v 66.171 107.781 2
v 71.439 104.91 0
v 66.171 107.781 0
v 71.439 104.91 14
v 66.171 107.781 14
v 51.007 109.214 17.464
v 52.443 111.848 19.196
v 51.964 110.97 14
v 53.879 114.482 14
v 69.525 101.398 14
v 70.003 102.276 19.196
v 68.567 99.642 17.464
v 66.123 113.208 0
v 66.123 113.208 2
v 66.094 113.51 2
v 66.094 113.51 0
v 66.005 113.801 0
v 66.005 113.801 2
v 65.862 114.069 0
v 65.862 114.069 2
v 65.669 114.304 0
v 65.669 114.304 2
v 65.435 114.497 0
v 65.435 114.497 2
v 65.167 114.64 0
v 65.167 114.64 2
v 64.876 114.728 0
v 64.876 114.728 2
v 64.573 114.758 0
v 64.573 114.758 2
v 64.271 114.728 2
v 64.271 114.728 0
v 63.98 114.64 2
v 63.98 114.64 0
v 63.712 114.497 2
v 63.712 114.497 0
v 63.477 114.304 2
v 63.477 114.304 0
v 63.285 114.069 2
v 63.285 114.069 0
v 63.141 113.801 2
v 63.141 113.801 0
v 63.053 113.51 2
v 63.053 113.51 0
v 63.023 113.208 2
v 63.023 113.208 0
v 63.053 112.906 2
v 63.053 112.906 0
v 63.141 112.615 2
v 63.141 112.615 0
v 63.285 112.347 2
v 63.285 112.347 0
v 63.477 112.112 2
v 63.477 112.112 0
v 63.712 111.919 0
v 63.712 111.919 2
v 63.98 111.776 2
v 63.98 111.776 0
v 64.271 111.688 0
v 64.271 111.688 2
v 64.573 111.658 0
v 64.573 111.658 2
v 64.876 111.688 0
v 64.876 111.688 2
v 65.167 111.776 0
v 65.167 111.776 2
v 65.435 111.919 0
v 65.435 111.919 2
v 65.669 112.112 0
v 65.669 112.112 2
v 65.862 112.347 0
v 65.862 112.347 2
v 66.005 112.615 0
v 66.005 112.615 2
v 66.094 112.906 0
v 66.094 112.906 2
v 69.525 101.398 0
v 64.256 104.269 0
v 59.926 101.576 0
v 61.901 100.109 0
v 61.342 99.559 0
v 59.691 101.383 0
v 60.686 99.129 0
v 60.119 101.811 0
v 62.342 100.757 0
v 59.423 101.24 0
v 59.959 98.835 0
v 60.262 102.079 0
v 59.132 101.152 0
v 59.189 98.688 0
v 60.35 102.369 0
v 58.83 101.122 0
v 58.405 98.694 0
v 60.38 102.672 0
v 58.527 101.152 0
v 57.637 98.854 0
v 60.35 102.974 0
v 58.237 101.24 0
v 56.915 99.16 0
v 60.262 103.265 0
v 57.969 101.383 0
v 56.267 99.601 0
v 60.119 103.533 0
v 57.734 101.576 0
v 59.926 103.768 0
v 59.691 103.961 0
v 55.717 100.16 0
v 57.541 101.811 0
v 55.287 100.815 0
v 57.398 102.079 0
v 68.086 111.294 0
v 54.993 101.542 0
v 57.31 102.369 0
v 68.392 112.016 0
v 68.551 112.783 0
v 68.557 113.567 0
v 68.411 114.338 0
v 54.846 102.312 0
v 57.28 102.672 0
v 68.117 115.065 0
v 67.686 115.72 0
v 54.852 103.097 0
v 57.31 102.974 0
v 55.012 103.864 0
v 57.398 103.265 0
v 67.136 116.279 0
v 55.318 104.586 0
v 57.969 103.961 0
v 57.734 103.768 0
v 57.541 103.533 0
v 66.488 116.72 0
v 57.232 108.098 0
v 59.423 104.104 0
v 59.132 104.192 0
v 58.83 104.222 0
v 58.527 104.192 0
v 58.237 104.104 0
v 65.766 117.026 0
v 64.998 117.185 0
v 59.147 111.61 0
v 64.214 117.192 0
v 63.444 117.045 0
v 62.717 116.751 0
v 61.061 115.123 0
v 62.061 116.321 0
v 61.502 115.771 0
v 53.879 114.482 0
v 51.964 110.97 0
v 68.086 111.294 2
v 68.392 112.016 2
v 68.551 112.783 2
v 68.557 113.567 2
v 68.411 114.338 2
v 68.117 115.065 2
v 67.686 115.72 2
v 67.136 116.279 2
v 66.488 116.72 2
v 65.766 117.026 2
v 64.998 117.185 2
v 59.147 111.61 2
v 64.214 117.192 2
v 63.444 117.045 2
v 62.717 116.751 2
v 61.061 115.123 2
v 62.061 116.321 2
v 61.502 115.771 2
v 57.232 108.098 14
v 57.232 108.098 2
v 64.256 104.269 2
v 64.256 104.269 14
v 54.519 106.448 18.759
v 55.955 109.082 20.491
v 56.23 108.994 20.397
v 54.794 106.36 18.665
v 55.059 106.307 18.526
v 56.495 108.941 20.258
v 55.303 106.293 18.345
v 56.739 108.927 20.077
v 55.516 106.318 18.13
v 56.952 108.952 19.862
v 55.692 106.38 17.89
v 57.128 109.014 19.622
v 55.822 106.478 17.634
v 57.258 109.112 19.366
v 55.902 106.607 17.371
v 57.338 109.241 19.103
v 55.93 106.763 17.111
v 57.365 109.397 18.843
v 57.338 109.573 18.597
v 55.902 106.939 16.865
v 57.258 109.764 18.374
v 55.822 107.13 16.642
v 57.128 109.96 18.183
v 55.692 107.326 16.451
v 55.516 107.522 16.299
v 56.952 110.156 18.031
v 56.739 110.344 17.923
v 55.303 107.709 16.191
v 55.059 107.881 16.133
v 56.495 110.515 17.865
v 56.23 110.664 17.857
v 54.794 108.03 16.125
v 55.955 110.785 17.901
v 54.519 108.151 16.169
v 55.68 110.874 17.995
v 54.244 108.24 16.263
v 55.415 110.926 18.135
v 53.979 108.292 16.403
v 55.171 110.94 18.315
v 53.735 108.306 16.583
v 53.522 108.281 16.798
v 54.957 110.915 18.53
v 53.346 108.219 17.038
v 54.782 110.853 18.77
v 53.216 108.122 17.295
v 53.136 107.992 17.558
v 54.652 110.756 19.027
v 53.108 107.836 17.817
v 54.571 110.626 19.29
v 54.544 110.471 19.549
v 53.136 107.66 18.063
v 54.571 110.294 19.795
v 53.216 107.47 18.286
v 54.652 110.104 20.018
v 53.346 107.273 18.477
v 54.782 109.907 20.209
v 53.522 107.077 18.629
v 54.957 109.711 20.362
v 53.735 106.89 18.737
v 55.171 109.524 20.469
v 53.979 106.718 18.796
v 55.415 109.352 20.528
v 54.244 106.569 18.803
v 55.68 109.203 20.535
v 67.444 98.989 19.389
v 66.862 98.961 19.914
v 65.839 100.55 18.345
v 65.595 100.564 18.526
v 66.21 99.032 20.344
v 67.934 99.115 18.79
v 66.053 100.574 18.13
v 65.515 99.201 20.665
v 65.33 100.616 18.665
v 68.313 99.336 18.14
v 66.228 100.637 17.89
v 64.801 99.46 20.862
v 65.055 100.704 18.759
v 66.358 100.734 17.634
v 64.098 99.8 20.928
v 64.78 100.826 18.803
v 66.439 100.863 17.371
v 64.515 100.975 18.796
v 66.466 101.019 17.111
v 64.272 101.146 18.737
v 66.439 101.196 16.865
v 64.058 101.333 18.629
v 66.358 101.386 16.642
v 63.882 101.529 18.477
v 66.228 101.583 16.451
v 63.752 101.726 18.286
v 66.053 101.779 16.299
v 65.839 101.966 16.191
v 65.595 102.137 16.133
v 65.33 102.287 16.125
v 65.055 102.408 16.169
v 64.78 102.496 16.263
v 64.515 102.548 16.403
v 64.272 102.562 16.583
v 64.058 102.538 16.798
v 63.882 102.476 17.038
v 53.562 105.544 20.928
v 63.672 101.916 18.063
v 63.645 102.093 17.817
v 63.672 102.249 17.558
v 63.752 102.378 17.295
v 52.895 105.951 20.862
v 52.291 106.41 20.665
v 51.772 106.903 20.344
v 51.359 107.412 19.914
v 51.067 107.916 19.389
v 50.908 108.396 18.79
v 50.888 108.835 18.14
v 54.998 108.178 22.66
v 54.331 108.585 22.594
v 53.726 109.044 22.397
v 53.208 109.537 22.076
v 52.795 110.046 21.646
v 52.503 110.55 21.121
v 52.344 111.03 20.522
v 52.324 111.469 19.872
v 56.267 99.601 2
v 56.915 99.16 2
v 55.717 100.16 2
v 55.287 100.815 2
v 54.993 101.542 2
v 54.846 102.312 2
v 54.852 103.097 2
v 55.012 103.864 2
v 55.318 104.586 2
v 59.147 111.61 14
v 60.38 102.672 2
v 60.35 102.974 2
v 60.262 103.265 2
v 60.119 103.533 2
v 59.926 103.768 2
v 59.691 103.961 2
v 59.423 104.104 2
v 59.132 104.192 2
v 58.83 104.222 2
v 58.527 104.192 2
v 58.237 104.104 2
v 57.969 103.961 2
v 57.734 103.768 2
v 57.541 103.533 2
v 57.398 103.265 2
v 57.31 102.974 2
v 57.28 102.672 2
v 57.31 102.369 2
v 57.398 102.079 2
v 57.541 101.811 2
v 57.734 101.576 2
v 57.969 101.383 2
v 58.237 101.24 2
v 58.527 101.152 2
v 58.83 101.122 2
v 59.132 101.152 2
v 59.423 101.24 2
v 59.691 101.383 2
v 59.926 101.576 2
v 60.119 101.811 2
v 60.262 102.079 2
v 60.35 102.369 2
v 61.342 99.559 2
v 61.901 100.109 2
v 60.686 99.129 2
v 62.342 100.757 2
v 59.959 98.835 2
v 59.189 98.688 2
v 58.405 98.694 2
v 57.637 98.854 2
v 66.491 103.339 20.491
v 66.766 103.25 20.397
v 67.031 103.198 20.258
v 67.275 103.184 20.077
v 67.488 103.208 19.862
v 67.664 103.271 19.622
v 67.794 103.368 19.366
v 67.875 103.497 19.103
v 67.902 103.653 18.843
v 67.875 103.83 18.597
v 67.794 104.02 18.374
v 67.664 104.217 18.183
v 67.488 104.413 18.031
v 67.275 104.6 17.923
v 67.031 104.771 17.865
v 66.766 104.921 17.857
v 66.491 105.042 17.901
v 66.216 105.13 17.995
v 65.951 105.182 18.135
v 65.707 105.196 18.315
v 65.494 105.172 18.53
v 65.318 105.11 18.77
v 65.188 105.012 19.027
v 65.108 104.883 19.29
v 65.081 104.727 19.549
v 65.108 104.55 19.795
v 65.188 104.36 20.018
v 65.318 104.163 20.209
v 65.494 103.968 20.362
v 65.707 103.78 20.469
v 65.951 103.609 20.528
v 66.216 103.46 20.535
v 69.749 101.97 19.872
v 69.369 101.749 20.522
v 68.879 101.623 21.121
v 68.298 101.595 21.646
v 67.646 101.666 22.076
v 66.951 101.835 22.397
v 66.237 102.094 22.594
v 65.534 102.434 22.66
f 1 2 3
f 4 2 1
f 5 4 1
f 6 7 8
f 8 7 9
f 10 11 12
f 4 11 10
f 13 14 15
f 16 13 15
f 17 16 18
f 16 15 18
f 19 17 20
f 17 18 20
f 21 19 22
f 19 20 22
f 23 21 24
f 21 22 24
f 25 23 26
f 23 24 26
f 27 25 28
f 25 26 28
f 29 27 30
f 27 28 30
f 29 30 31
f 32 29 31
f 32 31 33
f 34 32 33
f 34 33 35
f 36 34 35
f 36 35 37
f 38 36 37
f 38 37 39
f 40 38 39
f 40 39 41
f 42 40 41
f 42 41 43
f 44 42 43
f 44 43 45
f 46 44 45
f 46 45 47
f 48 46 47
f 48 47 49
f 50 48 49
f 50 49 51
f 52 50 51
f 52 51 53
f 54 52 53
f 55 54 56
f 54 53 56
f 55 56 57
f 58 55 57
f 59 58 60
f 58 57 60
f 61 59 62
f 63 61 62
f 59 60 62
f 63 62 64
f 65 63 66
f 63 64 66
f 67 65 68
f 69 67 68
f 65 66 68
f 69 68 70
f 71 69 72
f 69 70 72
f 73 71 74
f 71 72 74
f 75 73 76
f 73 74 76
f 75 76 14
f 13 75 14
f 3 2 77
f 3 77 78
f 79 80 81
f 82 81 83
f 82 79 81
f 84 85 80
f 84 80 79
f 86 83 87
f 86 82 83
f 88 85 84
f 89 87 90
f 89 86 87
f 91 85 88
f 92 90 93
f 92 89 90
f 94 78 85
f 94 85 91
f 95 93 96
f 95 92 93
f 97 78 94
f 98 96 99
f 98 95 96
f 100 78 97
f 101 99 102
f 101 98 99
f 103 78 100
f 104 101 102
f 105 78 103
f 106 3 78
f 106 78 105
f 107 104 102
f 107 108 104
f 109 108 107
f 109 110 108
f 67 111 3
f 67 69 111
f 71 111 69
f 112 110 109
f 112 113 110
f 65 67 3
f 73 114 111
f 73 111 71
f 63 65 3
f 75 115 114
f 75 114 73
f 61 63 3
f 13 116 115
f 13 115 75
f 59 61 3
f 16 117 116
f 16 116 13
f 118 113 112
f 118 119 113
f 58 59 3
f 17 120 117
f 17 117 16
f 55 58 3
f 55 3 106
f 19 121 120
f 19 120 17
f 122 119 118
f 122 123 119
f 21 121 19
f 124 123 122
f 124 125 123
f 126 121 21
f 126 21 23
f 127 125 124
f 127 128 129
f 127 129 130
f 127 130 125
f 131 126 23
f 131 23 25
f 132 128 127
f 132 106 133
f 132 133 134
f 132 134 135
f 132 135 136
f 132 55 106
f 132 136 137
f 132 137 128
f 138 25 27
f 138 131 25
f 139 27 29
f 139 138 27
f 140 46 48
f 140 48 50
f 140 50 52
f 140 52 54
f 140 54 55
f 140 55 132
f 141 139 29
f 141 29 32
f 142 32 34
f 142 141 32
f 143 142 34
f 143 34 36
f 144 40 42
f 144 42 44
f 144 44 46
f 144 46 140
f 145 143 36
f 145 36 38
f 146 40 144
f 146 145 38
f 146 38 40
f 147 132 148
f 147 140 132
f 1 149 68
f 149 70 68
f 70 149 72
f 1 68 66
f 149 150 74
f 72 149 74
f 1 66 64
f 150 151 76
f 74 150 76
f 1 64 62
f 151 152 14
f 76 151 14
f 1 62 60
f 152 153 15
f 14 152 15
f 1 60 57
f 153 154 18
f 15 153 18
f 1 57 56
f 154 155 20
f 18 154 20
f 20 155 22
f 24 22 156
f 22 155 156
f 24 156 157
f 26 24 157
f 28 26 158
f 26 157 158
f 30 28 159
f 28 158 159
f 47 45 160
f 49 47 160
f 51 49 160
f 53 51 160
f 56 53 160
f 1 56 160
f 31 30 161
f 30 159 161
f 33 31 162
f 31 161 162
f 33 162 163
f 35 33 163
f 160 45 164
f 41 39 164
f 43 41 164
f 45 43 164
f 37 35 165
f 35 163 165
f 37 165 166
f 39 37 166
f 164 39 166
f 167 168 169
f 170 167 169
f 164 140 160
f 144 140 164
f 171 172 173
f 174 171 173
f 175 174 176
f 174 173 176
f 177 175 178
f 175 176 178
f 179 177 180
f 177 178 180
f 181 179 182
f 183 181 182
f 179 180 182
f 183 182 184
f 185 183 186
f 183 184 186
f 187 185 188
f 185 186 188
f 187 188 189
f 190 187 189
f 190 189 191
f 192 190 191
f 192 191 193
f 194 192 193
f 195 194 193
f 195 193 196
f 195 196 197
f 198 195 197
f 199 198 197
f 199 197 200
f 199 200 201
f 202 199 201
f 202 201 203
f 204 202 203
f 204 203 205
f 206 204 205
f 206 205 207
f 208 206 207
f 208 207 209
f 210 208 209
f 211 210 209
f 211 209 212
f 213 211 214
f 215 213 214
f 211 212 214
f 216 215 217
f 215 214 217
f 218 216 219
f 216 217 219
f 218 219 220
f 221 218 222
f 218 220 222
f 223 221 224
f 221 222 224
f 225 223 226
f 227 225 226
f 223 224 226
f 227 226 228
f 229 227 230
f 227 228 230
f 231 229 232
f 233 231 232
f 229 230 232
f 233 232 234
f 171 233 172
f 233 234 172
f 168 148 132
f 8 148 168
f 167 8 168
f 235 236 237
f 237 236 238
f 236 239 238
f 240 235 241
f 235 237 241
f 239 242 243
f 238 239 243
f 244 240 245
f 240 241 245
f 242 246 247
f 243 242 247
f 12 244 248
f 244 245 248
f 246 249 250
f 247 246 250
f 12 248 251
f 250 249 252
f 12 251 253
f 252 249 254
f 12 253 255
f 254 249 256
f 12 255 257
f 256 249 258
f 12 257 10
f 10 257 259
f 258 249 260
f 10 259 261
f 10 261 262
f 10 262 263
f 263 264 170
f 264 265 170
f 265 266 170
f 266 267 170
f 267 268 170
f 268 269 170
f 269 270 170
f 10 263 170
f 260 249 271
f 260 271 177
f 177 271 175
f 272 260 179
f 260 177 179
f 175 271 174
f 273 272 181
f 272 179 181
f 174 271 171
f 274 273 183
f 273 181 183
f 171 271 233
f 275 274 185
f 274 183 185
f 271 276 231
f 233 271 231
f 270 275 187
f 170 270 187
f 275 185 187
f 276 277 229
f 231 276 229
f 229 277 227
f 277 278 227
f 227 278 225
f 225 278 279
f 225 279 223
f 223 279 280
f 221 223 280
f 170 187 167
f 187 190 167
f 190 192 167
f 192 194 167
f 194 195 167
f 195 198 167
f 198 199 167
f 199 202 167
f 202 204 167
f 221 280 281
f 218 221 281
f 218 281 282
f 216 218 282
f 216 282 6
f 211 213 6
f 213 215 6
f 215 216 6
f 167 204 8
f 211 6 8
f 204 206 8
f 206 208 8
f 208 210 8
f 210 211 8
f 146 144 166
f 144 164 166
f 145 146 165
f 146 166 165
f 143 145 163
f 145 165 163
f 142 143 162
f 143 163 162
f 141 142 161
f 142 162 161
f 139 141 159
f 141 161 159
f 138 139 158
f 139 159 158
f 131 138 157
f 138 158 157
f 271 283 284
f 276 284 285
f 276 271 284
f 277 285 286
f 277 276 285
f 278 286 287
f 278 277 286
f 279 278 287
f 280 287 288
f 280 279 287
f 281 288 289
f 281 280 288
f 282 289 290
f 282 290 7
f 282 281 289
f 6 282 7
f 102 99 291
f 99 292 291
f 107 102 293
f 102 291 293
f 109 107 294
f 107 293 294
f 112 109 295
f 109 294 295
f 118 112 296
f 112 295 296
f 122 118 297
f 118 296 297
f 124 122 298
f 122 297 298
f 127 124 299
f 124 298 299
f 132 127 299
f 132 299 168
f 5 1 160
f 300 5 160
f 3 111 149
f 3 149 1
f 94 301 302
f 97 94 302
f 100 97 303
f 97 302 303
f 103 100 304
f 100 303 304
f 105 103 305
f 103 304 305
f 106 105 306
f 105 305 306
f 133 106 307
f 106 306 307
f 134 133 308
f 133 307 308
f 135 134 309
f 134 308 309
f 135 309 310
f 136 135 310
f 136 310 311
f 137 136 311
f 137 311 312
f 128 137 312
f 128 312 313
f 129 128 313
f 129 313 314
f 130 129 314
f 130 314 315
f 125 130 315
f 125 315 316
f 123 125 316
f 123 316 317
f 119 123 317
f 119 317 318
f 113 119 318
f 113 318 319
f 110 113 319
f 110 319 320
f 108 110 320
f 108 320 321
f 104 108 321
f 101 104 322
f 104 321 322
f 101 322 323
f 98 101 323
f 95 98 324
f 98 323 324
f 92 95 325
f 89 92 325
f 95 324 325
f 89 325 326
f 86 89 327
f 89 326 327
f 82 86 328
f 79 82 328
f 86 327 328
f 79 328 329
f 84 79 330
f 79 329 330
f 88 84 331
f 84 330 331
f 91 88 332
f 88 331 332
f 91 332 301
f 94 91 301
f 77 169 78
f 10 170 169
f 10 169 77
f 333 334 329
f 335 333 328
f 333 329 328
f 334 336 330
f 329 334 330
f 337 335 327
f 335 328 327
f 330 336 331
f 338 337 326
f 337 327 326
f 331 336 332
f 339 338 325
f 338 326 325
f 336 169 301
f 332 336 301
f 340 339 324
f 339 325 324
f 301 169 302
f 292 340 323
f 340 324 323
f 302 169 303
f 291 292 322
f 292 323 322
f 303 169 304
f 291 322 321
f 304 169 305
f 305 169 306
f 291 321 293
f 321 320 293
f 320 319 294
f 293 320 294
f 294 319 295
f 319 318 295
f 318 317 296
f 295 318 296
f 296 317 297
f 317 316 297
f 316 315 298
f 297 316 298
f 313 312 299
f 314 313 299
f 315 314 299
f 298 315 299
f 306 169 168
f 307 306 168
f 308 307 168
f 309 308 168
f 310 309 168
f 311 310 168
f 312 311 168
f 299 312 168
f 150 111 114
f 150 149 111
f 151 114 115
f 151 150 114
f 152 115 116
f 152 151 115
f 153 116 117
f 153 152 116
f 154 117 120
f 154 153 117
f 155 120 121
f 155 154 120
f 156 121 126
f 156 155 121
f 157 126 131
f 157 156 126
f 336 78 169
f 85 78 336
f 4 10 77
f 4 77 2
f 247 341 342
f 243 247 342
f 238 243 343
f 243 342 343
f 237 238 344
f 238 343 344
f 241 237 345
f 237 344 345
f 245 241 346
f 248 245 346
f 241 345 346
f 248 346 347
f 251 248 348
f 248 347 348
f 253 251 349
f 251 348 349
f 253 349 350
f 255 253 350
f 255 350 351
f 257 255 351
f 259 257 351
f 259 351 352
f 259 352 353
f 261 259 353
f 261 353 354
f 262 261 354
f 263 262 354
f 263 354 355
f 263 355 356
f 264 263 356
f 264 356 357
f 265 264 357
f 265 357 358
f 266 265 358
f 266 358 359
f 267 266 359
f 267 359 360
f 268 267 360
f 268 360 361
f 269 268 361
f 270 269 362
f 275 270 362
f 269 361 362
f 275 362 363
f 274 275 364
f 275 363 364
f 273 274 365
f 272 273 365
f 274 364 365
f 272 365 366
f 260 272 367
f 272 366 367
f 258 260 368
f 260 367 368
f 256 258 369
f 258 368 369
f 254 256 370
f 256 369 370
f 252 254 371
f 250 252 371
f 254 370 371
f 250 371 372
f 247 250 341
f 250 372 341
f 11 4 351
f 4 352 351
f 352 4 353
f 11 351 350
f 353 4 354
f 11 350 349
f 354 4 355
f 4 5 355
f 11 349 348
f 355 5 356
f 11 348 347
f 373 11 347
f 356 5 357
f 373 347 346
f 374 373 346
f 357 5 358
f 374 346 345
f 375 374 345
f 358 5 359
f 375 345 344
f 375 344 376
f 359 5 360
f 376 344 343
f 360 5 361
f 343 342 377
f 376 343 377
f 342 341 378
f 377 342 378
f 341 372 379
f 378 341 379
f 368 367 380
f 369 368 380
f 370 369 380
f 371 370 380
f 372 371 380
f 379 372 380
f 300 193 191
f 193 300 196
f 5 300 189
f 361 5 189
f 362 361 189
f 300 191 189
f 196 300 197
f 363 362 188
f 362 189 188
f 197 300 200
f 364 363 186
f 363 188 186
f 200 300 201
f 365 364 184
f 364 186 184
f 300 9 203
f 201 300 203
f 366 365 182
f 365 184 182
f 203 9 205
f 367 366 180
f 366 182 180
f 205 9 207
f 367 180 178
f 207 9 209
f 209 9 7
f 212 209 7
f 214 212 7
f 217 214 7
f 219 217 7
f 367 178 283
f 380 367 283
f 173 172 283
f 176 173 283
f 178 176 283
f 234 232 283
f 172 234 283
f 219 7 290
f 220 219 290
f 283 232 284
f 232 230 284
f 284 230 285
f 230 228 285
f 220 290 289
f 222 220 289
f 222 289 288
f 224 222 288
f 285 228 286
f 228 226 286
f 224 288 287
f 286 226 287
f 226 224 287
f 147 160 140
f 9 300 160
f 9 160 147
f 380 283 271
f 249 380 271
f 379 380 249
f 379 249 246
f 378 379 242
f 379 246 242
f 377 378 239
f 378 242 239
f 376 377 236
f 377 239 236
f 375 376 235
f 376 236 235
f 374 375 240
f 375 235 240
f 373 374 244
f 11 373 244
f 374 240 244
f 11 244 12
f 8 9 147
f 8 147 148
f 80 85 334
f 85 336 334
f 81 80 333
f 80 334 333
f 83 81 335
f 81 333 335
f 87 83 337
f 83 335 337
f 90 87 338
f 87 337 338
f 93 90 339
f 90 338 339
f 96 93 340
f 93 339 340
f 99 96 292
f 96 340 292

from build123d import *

# Parameters (mm, degrees)
BOSS_EXTRUDE1_DEPTH             = 2
FILLET1_R                       = 4
CUT_EXTRUDE1_REACH              = 137.809
SKETCH2_R                       = 1.55
BOSS_EXTRUDE2_DEPTH             = 12
BOSS_EXTRUDE2_DIRECTION_2_REACH = 137.809
BOSS_EXTRUDE3_DEPTH             = 20
FILLET2_R                       = 4
CUT_EXTRUDE2_REACH              = 70.911
SKETCH5_R                       = 1.55


with BuildPart() as part:
    # Sketch1 → Boss-Extrude1 (new body)
    with BuildSketch(Plane.XY):
        Polygon((70, 114.805547545), (60.427350908, 97.245240333), (53.403228024, 101.07429997), (62.975877115, 118.634607181), align=None)
    extrude(amount=BOSS_EXTRUDE1_DEPTH)

    # Fillet1
    fillet1_edges = [part.edges().sort_by_distance(p)[0] for p in [
        (60.427350908, 97.245240333, 1),
        (53.403228024, 101.07429997, 1),
        (70, 114.805547545, 1),
        (62.975877115, 118.634607181, 1),
    ]]
    fillet(fillet1_edges, radius=FILLET1_R - 0.0001)  # a hair under: the kernel refuses the full size

    # Sketch2 → Cut-Extrude1 (cut, up to next)
    with BuildSketch(Plane.XY.offset(2), mode=Mode.PRIVATE) as cut_extrude1_sk1:
        with Locations((64.573408739, 113.208015921)):
            Circle(SKETCH2_R)
    cut_extrude1_tool1 = extrude(cut_extrude1_sk1.sketch, amount=-CUT_EXTRUDE1_REACH, mode=Mode.PRIVATE) & part.part
    # Sketch2 → Cut-Extrude1 (cut, up to next)
    with BuildSketch(Plane.XY.offset(2), mode=Mode.PRIVATE) as cut_extrude1_sk2:
        with Locations((58.829819284, 102.671831594)):
            Circle(SKETCH2_R)
    cut_extrude1_tool2 = extrude(cut_extrude1_sk2.sketch, amount=-CUT_EXTRUDE1_REACH, mode=Mode.PRIVATE) & part.part
    add(cut_extrude1_tool1.solids().sort_by_distance((64.573409, 113.208016, 2))[0], mode=Mode.SUBTRACT)
    add(cut_extrude1_tool2.solids().sort_by_distance((58.829819, 102.671832, 2))[0], mode=Mode.SUBTRACT)

    # Sketch3 → Boss-Extrude2 (add)
    with BuildSketch(Plane.XY.offset(2)):
        Polygon((66.170940363, 107.78142466), (59.146817479, 111.610484297), (53.878725315, 114.482279024), (51.964195497, 110.970217582), (57.23228766, 108.098422855), (64.256410545, 104.269363218), (69.524502708, 101.39756849), (71.439032527, 104.909629933), align=None)
    extrude(amount=BOSS_EXTRUDE2_DEPTH)

    # Boss-Extrude2 direction 2: up to this face of the body (flat: up to its plane)
    boss_extrude2_direction_2_end = Plane(part.part.faces().sort_by_distance((61.701614012, 107.939923757, 0))[0])
    # Sketch3 → Boss-Extrude2 direction 2 (add, up to the picked face)
    with BuildSketch(Plane.XY.offset(2), mode=Mode.PRIVATE) as boss_extrude2_direction_2_sk1:
        Polygon((66.170940363, 107.78142466), (59.146817479, 111.610484297), (53.878725315, 114.482279024), (51.964195497, 110.970217582), (57.23228766, 108.098422855), (64.256410545, 104.269363218), (69.524502708, 101.39756849), (71.439032527, 104.909629933), align=None)
    boss_extrude2_direction_2_tool1 = split(extrude(boss_extrude2_direction_2_sk1.sketch, amount=-BOSS_EXTRUDE2_DIRECTION_2_REACH, mode=Mode.PRIVATE), bisect_by=boss_extrude2_direction_2_end, keep=Keep.BOTH, mode=Mode.PRIVATE)
    add(boss_extrude2_direction_2_tool1.solids().sort_by(Axis((61.701614, 107.939924, 2), (0, 0, -1)))[0])

    # Sketch4 → Boss-Extrude3 (add)
    with BuildSketch(Plane(origin=(-6.575093345, 3.584280194, 0), x_dir=(0, 0, 1), z_dir=(-0.8780153605811593, 0.4786324545865408, 0))):
        Polygon((22.660254038, 121.305306045), (20.92820323, 118.305306045), (14, 122.305306045), (14, 126.305306045), align=None)
    extrude(amount=-BOSS_EXTRUDE3_DEPTH)

    # Fillet2
    fillet2_edges = [part.edges().sort_by_distance(p)[0] for p in [
        (50.76761436, 108.775179181, 21.794228634),
        (68.327921572, 99.202530089, 21.794228634),
    ]]
    fillet(fillet2_edges, radius=FILLET2_R)

    # Sketch5 → Cut-Extrude2 (cut, up to next)
    with BuildSketch(Plane(origin=(48.241919048, 88.496184373, 58.191801834), x_dir=(0.9100457296544759, -0.34633972242186517, -0.22774012955647066), z_dir=(0.41450786474764584, 0.7603836071762374, 0.5000000000000009)), mode=Mode.PRIVATE) as cut_extrude2_sk1:
        with Locations(Location((8.475365681, 44.360860805, 0), (0, 0, 270))):
            Circle(SKETCH5_R)
    cut_extrude2_tool1 = extrude(cut_extrude2_sk1.sketch, amount=-CUT_EXTRUDE2_REACH, mode=Mode.PRIVATE) & part.part
    # Sketch5 → Cut-Extrude2 (cut, up to next)
    with BuildSketch(Plane(origin=(48.241919048, 88.496184373, 58.191801834), x_dir=(0.9100457296544759, -0.34633972242186517, -0.22774012955647066), z_dir=(0.41450786474764584, 0.7603836071762374, 0.5000000000000009)), mode=Mode.PRIVATE) as cut_extrude2_sk2:
        with Locations(Location((20.053008413, 41.205201002, 0), (0, 0, 270))):
            Circle(SKETCH5_R)
    cut_extrude2_tool2 = extrude(cut_extrude2_sk2.sketch, amount=-CUT_EXTRUDE2_REACH, mode=Mode.PRIVATE) & part.part
    add(cut_extrude2_tool1.solids().sort_by_distance((55.954889, 109.933703, 19.196152))[0], mode=Mode.SUBTRACT)
    add(cut_extrude2_tool2.solids().sort_by_distance((66.491074, 104.190114, 19.196152))[0], mode=Mode.SUBTRACT)


solid = part.part
